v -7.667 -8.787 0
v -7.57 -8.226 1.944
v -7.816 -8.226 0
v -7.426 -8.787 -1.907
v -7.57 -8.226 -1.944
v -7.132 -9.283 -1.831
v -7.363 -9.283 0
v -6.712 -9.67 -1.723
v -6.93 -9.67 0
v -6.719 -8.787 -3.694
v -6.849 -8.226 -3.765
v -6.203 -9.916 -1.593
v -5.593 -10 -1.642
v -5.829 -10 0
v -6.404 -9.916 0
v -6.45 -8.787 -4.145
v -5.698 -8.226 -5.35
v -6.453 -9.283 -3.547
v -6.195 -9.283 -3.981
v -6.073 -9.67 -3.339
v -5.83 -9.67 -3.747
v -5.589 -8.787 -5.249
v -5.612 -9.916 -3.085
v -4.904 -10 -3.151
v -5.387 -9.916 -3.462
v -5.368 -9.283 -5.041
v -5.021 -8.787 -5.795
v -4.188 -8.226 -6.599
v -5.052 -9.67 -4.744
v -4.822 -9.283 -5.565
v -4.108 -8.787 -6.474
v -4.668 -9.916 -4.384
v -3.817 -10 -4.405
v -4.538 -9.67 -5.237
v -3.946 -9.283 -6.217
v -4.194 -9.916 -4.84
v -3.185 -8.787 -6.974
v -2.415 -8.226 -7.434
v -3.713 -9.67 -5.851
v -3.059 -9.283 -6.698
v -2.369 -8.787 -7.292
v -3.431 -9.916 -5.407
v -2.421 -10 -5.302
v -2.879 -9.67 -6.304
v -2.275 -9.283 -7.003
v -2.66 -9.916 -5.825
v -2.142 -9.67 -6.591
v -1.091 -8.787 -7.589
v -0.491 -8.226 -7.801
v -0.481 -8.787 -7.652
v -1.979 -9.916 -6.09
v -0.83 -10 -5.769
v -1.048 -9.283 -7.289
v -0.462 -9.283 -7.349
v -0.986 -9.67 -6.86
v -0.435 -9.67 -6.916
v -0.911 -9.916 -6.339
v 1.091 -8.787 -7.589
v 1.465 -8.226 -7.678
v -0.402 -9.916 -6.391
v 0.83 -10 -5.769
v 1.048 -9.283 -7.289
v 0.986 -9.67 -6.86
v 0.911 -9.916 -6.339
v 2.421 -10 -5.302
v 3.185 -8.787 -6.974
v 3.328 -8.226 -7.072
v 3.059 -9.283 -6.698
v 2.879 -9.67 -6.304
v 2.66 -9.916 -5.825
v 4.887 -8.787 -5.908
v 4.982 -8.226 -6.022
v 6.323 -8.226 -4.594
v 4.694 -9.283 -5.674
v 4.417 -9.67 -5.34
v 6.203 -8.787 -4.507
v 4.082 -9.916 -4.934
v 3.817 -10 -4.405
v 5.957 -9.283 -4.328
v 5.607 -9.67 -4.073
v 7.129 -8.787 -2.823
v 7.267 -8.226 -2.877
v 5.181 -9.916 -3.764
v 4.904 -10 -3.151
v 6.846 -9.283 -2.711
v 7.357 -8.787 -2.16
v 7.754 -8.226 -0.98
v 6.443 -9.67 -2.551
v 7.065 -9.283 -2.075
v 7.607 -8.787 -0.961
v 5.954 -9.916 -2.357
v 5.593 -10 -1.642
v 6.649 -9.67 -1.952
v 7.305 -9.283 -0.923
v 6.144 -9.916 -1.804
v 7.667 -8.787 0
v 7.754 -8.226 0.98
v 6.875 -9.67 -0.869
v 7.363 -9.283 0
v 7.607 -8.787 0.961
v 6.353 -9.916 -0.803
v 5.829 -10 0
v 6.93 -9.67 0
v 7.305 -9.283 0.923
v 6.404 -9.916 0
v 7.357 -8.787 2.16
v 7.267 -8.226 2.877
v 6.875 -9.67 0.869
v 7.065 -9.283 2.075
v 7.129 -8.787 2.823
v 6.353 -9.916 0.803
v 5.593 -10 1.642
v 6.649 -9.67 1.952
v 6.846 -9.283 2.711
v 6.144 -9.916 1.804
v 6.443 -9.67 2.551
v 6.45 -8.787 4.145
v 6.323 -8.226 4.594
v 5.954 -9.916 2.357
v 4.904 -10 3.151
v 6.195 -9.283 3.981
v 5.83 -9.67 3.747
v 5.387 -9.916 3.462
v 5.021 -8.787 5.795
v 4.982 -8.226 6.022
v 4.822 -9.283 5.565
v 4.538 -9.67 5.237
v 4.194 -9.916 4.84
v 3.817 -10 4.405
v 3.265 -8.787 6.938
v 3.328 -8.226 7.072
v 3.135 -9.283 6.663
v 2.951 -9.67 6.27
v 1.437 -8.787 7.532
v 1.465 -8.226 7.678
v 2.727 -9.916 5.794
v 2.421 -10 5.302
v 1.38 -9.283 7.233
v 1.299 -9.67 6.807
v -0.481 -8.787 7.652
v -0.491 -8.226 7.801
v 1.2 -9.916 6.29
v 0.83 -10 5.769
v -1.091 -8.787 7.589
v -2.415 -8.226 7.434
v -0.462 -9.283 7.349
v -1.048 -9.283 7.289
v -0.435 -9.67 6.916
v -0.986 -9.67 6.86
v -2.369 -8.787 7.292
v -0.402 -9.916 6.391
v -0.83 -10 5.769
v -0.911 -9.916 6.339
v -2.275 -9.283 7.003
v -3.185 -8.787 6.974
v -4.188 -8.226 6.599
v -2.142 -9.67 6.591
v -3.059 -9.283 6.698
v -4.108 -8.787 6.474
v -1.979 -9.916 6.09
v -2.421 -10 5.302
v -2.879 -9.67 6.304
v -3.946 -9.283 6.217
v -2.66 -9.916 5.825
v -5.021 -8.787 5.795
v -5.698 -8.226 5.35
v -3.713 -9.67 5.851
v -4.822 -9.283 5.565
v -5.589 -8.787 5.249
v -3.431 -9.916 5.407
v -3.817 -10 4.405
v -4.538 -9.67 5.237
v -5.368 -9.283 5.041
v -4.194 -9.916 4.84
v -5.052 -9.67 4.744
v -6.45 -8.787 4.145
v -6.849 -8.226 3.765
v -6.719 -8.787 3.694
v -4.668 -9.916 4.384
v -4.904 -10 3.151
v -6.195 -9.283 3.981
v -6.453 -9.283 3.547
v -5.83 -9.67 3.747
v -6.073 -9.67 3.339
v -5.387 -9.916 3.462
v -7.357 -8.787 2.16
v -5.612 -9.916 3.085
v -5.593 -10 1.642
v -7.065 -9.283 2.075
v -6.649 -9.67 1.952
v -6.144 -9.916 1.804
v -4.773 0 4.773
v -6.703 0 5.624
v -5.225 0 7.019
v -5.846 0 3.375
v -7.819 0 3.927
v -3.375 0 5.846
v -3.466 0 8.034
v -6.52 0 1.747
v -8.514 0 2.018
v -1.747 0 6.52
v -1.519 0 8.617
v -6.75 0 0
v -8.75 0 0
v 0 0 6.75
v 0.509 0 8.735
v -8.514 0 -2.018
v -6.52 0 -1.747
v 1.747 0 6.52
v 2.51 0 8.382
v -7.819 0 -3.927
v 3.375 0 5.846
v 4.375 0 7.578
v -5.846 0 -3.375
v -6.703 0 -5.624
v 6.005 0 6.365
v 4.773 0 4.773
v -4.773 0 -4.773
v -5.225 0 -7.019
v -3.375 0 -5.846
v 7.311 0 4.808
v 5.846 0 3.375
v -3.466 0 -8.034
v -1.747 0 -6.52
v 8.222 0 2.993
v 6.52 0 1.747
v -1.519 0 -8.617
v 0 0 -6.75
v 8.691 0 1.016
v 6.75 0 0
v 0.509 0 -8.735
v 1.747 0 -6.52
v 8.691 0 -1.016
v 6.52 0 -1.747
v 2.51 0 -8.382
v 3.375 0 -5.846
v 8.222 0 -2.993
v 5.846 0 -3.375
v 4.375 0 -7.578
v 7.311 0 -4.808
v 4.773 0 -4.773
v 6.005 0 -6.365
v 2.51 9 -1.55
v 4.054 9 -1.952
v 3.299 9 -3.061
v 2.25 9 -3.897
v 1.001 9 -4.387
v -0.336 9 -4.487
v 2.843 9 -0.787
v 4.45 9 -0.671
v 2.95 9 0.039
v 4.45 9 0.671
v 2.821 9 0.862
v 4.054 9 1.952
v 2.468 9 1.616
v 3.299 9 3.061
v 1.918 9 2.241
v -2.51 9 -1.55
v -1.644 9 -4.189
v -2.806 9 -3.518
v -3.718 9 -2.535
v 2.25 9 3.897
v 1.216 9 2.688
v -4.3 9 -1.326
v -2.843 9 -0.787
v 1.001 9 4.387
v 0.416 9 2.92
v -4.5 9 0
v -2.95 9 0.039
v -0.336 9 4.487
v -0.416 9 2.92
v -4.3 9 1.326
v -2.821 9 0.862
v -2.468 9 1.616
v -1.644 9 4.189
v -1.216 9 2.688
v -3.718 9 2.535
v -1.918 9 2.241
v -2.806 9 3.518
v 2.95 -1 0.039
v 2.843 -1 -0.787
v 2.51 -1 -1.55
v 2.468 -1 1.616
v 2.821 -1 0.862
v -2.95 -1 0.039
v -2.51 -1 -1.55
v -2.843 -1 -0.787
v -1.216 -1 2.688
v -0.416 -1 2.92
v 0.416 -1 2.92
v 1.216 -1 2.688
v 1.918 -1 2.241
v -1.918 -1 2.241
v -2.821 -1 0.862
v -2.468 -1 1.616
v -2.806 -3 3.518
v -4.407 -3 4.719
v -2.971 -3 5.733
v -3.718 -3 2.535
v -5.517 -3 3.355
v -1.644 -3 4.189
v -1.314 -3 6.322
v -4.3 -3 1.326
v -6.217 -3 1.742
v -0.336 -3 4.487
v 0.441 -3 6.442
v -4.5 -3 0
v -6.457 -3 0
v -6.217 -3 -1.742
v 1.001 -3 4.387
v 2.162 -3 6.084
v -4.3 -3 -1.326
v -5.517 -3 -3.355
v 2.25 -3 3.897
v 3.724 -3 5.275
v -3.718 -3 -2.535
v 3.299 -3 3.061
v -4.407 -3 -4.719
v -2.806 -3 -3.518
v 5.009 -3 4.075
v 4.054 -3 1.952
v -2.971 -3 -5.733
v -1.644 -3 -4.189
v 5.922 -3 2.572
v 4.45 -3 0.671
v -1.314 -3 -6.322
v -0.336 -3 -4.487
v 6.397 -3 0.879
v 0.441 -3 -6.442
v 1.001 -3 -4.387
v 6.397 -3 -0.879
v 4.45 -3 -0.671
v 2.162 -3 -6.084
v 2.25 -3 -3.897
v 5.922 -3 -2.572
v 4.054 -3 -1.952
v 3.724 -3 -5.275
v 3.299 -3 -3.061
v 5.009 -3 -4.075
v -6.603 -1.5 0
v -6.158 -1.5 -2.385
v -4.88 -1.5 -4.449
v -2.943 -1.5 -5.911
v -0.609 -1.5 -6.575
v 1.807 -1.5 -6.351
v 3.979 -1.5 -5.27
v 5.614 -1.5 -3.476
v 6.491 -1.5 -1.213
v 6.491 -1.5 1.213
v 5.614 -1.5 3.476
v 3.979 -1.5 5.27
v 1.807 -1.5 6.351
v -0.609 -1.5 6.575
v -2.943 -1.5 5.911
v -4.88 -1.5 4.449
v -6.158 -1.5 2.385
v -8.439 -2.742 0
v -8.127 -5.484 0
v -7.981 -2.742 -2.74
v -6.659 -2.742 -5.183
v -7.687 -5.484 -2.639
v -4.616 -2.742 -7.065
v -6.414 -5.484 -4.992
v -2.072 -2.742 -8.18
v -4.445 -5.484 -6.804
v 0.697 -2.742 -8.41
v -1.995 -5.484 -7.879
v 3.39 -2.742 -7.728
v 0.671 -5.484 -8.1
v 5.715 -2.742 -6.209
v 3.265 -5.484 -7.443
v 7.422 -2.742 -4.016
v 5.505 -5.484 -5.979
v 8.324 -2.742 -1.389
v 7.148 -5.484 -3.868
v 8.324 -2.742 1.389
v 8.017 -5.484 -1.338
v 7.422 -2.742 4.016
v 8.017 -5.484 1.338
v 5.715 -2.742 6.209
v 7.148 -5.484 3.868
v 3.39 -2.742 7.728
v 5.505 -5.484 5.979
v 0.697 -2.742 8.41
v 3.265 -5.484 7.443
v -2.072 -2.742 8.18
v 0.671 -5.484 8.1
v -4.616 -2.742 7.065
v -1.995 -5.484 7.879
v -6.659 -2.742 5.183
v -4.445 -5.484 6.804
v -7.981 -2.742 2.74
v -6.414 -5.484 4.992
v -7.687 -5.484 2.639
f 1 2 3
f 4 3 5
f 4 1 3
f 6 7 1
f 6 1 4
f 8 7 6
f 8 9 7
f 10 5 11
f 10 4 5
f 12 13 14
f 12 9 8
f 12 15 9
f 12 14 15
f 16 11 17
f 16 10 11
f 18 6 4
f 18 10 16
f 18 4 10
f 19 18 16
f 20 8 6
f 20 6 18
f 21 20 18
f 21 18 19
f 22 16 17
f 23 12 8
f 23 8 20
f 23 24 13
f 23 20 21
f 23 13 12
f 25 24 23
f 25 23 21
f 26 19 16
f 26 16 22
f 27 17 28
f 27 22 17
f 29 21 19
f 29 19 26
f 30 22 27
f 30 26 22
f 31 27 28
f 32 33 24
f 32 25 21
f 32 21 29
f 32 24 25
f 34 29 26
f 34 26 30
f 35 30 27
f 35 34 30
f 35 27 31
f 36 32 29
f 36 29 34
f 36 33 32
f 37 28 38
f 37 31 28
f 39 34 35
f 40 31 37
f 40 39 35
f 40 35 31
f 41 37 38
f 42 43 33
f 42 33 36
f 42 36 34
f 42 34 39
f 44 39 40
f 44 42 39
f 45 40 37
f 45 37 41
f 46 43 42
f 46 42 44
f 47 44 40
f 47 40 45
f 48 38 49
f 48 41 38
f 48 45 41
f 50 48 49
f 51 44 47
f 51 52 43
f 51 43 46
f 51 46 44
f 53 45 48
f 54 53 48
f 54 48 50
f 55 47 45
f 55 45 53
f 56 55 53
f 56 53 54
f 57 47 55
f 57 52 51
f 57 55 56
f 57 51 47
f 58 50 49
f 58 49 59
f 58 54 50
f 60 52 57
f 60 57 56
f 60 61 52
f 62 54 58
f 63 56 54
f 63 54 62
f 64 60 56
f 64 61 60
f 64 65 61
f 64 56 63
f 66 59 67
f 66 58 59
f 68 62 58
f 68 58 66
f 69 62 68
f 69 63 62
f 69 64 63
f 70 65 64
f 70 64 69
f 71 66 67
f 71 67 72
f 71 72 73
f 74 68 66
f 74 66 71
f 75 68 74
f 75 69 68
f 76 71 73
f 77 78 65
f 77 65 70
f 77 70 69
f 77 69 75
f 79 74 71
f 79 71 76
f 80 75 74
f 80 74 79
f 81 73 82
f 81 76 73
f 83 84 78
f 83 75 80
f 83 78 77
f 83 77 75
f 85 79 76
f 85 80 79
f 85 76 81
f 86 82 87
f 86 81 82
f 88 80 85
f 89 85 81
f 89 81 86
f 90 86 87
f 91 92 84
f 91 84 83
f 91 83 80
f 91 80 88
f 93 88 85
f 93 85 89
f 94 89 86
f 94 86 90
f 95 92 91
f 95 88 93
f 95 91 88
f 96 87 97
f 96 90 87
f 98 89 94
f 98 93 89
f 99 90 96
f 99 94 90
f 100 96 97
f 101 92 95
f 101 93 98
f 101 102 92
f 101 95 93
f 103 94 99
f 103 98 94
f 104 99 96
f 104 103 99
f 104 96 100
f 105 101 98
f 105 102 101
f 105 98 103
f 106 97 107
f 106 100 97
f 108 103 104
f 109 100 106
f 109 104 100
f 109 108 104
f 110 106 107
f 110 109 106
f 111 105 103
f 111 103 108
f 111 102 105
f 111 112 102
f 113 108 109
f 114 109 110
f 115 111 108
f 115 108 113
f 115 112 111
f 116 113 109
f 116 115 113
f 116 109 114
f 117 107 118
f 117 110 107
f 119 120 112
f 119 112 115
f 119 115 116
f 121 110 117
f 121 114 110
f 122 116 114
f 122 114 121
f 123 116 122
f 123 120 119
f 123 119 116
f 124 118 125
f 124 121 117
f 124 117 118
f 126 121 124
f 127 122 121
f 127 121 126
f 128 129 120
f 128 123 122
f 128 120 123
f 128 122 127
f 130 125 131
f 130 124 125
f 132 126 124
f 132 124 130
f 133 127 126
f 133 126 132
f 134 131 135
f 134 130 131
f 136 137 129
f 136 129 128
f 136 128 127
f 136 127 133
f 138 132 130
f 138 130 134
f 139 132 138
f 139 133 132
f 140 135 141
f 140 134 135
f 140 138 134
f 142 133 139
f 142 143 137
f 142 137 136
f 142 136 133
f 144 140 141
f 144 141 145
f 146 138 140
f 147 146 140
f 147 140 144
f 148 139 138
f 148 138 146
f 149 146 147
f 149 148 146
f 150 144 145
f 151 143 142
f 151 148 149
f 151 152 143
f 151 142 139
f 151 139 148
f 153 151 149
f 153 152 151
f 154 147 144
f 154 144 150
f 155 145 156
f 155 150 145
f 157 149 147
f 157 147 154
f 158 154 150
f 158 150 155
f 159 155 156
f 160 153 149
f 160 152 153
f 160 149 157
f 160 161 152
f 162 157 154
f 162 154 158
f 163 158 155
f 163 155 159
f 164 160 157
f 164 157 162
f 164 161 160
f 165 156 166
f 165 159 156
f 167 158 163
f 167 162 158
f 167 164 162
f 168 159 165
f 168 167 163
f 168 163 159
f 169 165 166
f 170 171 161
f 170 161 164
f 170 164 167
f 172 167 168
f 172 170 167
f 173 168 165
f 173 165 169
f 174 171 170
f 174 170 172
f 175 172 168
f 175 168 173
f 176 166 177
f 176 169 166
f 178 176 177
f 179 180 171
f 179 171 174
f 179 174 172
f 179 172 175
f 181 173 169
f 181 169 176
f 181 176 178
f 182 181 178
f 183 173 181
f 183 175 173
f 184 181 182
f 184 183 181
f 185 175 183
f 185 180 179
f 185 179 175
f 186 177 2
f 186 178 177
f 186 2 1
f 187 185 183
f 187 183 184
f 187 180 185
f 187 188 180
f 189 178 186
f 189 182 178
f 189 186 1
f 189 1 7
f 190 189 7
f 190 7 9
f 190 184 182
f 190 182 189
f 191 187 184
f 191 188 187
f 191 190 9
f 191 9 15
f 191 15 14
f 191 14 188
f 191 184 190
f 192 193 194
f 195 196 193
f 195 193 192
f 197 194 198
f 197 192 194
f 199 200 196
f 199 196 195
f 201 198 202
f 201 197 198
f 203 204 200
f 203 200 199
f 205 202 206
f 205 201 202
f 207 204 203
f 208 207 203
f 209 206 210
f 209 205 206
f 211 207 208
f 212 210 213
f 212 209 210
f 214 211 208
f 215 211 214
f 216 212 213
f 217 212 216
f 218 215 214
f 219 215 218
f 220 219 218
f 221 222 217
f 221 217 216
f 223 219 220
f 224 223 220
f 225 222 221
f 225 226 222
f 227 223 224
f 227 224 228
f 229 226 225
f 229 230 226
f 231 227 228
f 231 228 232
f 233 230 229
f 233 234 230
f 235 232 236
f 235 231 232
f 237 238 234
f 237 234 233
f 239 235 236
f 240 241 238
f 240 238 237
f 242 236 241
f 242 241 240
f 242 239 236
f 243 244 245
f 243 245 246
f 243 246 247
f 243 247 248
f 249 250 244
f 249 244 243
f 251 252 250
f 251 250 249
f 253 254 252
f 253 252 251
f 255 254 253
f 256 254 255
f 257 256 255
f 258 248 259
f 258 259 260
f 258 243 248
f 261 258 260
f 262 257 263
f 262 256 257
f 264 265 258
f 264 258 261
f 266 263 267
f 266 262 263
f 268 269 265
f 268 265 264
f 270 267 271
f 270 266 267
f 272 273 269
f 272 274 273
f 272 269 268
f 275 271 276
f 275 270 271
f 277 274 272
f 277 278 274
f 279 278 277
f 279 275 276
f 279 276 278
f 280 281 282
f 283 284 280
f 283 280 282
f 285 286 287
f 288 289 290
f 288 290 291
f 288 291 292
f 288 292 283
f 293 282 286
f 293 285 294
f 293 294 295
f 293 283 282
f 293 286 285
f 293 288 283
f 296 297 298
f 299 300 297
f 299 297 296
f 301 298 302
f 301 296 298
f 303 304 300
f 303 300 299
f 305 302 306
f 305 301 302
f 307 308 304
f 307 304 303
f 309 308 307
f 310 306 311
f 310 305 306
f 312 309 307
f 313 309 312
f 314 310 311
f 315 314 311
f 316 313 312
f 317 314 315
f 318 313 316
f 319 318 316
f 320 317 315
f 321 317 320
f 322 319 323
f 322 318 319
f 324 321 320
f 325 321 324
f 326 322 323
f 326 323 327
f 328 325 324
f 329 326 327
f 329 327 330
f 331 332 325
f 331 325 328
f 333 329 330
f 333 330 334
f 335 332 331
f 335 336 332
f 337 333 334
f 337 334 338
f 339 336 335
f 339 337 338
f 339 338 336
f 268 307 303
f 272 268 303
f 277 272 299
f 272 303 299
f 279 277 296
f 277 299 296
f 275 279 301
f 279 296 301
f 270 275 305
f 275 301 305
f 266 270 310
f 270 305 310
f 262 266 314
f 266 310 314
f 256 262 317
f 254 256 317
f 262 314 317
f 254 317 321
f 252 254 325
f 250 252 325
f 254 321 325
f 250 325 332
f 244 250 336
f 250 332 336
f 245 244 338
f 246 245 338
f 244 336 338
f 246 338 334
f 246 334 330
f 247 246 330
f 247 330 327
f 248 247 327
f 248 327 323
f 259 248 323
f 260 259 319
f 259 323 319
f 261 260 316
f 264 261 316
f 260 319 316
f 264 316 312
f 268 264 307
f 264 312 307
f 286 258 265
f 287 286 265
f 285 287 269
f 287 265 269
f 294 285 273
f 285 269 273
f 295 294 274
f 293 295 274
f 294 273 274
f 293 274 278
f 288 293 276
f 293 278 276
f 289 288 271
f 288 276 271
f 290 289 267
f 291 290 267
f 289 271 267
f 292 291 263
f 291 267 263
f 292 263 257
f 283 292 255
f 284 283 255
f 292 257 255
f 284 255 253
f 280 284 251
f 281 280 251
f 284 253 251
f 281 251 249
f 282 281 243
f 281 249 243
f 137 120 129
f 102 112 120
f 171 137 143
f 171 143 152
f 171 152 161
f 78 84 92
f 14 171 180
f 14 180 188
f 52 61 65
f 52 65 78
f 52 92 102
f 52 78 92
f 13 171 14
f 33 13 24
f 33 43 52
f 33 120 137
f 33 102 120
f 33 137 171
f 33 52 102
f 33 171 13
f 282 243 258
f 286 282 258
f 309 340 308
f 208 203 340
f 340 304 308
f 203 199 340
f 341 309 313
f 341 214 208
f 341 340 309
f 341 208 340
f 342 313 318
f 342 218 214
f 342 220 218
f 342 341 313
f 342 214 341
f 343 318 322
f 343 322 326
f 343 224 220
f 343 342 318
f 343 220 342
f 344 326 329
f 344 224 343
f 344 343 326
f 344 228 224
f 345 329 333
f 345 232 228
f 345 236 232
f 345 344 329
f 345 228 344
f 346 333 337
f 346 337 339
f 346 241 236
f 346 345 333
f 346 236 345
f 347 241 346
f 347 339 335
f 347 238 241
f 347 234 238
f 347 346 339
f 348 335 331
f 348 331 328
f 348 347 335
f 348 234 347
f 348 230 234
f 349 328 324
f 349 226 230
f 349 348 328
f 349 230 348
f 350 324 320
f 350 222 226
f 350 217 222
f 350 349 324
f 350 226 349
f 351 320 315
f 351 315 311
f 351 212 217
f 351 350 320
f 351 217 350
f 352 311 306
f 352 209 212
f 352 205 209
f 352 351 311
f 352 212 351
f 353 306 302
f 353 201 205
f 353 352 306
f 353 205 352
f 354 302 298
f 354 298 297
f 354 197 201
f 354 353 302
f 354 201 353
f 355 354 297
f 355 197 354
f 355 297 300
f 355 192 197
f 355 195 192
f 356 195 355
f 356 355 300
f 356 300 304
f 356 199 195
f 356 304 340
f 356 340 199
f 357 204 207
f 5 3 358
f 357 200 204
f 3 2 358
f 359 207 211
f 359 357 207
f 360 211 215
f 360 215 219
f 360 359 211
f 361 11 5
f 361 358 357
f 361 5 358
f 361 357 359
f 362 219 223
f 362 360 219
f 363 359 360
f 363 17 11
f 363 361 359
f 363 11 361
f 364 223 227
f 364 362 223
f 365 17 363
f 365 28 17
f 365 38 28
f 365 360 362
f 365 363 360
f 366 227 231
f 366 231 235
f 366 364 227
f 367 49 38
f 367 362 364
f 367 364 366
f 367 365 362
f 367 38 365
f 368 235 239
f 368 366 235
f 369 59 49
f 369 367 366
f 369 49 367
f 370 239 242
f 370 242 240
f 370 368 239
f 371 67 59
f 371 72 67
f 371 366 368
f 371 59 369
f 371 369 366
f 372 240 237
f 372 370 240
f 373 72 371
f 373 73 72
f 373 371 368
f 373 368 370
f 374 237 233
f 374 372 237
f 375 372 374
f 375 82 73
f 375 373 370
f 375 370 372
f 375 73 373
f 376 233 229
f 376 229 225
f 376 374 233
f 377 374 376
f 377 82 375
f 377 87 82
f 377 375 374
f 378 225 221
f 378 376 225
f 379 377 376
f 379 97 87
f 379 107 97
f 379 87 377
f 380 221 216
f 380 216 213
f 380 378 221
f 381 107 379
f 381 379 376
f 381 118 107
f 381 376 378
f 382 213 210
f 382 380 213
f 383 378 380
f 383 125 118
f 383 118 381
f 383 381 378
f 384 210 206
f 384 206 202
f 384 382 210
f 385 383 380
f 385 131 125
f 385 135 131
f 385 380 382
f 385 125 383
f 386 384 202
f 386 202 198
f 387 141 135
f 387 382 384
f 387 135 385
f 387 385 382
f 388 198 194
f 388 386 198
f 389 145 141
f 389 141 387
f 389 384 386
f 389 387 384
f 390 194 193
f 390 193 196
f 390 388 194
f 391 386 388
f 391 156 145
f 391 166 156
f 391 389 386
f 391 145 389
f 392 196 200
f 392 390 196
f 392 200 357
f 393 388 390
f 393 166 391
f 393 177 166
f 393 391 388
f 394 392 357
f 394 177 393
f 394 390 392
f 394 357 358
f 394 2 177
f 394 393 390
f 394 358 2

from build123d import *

# Parameters (mm, degrees)
F2_R     = 4.5
F3_DEPTH = 12
F5_DEPTH = 10


with BuildPart() as f1:
    # F0 (on Top) → F1 (revolve)
    with BuildSketch(Plane.XY):
        with BuildLine():
            Line((-6.456904, -3), (-6.75, 0))
            Line((-6.75, 0), (-8.75, 0))
            Line((-8.75, 0), (-7.816054, -8.225632))
            ThreePointArc((-7.816054, -8.225632), (-7.160877, -9.491855), (-5.828823, -10))
            Line((-5.828823, -10), (0, -10))
            Line((0, -10), (0, -3))
            Line((0, -3), (-6.456904, -3))
        make_face()
    revolve(axis=Axis((0, -5, 0), (0, -1, 0)))

    # F2 (on face) → F3 (join)
    with BuildSketch(Plane(origin=(0, -3, 0), x_dir=(-1, 0, 0), z_dir=(0, 1, 0))):
        Circle(F2_R)
    extrude(amount=F3_DEPTH)

    # F4 (on face) → F5 (cut)
    with BuildSketch(Plane(origin=(0, 9, 0), x_dir=(-1, 0, 0), z_dir=(0, 1, 0))):
        with BuildLine():
            Line((-2.50998, -1.55), (2.50998, -1.55))
            ThreePointArc((2.50998, -1.55), (0, 2.95), (-2.50998, -1.55))
        make_face()
    extrude(amount=-F5_DEPTH, mode=Mode.SUBTRACT)


solid = f1.part
